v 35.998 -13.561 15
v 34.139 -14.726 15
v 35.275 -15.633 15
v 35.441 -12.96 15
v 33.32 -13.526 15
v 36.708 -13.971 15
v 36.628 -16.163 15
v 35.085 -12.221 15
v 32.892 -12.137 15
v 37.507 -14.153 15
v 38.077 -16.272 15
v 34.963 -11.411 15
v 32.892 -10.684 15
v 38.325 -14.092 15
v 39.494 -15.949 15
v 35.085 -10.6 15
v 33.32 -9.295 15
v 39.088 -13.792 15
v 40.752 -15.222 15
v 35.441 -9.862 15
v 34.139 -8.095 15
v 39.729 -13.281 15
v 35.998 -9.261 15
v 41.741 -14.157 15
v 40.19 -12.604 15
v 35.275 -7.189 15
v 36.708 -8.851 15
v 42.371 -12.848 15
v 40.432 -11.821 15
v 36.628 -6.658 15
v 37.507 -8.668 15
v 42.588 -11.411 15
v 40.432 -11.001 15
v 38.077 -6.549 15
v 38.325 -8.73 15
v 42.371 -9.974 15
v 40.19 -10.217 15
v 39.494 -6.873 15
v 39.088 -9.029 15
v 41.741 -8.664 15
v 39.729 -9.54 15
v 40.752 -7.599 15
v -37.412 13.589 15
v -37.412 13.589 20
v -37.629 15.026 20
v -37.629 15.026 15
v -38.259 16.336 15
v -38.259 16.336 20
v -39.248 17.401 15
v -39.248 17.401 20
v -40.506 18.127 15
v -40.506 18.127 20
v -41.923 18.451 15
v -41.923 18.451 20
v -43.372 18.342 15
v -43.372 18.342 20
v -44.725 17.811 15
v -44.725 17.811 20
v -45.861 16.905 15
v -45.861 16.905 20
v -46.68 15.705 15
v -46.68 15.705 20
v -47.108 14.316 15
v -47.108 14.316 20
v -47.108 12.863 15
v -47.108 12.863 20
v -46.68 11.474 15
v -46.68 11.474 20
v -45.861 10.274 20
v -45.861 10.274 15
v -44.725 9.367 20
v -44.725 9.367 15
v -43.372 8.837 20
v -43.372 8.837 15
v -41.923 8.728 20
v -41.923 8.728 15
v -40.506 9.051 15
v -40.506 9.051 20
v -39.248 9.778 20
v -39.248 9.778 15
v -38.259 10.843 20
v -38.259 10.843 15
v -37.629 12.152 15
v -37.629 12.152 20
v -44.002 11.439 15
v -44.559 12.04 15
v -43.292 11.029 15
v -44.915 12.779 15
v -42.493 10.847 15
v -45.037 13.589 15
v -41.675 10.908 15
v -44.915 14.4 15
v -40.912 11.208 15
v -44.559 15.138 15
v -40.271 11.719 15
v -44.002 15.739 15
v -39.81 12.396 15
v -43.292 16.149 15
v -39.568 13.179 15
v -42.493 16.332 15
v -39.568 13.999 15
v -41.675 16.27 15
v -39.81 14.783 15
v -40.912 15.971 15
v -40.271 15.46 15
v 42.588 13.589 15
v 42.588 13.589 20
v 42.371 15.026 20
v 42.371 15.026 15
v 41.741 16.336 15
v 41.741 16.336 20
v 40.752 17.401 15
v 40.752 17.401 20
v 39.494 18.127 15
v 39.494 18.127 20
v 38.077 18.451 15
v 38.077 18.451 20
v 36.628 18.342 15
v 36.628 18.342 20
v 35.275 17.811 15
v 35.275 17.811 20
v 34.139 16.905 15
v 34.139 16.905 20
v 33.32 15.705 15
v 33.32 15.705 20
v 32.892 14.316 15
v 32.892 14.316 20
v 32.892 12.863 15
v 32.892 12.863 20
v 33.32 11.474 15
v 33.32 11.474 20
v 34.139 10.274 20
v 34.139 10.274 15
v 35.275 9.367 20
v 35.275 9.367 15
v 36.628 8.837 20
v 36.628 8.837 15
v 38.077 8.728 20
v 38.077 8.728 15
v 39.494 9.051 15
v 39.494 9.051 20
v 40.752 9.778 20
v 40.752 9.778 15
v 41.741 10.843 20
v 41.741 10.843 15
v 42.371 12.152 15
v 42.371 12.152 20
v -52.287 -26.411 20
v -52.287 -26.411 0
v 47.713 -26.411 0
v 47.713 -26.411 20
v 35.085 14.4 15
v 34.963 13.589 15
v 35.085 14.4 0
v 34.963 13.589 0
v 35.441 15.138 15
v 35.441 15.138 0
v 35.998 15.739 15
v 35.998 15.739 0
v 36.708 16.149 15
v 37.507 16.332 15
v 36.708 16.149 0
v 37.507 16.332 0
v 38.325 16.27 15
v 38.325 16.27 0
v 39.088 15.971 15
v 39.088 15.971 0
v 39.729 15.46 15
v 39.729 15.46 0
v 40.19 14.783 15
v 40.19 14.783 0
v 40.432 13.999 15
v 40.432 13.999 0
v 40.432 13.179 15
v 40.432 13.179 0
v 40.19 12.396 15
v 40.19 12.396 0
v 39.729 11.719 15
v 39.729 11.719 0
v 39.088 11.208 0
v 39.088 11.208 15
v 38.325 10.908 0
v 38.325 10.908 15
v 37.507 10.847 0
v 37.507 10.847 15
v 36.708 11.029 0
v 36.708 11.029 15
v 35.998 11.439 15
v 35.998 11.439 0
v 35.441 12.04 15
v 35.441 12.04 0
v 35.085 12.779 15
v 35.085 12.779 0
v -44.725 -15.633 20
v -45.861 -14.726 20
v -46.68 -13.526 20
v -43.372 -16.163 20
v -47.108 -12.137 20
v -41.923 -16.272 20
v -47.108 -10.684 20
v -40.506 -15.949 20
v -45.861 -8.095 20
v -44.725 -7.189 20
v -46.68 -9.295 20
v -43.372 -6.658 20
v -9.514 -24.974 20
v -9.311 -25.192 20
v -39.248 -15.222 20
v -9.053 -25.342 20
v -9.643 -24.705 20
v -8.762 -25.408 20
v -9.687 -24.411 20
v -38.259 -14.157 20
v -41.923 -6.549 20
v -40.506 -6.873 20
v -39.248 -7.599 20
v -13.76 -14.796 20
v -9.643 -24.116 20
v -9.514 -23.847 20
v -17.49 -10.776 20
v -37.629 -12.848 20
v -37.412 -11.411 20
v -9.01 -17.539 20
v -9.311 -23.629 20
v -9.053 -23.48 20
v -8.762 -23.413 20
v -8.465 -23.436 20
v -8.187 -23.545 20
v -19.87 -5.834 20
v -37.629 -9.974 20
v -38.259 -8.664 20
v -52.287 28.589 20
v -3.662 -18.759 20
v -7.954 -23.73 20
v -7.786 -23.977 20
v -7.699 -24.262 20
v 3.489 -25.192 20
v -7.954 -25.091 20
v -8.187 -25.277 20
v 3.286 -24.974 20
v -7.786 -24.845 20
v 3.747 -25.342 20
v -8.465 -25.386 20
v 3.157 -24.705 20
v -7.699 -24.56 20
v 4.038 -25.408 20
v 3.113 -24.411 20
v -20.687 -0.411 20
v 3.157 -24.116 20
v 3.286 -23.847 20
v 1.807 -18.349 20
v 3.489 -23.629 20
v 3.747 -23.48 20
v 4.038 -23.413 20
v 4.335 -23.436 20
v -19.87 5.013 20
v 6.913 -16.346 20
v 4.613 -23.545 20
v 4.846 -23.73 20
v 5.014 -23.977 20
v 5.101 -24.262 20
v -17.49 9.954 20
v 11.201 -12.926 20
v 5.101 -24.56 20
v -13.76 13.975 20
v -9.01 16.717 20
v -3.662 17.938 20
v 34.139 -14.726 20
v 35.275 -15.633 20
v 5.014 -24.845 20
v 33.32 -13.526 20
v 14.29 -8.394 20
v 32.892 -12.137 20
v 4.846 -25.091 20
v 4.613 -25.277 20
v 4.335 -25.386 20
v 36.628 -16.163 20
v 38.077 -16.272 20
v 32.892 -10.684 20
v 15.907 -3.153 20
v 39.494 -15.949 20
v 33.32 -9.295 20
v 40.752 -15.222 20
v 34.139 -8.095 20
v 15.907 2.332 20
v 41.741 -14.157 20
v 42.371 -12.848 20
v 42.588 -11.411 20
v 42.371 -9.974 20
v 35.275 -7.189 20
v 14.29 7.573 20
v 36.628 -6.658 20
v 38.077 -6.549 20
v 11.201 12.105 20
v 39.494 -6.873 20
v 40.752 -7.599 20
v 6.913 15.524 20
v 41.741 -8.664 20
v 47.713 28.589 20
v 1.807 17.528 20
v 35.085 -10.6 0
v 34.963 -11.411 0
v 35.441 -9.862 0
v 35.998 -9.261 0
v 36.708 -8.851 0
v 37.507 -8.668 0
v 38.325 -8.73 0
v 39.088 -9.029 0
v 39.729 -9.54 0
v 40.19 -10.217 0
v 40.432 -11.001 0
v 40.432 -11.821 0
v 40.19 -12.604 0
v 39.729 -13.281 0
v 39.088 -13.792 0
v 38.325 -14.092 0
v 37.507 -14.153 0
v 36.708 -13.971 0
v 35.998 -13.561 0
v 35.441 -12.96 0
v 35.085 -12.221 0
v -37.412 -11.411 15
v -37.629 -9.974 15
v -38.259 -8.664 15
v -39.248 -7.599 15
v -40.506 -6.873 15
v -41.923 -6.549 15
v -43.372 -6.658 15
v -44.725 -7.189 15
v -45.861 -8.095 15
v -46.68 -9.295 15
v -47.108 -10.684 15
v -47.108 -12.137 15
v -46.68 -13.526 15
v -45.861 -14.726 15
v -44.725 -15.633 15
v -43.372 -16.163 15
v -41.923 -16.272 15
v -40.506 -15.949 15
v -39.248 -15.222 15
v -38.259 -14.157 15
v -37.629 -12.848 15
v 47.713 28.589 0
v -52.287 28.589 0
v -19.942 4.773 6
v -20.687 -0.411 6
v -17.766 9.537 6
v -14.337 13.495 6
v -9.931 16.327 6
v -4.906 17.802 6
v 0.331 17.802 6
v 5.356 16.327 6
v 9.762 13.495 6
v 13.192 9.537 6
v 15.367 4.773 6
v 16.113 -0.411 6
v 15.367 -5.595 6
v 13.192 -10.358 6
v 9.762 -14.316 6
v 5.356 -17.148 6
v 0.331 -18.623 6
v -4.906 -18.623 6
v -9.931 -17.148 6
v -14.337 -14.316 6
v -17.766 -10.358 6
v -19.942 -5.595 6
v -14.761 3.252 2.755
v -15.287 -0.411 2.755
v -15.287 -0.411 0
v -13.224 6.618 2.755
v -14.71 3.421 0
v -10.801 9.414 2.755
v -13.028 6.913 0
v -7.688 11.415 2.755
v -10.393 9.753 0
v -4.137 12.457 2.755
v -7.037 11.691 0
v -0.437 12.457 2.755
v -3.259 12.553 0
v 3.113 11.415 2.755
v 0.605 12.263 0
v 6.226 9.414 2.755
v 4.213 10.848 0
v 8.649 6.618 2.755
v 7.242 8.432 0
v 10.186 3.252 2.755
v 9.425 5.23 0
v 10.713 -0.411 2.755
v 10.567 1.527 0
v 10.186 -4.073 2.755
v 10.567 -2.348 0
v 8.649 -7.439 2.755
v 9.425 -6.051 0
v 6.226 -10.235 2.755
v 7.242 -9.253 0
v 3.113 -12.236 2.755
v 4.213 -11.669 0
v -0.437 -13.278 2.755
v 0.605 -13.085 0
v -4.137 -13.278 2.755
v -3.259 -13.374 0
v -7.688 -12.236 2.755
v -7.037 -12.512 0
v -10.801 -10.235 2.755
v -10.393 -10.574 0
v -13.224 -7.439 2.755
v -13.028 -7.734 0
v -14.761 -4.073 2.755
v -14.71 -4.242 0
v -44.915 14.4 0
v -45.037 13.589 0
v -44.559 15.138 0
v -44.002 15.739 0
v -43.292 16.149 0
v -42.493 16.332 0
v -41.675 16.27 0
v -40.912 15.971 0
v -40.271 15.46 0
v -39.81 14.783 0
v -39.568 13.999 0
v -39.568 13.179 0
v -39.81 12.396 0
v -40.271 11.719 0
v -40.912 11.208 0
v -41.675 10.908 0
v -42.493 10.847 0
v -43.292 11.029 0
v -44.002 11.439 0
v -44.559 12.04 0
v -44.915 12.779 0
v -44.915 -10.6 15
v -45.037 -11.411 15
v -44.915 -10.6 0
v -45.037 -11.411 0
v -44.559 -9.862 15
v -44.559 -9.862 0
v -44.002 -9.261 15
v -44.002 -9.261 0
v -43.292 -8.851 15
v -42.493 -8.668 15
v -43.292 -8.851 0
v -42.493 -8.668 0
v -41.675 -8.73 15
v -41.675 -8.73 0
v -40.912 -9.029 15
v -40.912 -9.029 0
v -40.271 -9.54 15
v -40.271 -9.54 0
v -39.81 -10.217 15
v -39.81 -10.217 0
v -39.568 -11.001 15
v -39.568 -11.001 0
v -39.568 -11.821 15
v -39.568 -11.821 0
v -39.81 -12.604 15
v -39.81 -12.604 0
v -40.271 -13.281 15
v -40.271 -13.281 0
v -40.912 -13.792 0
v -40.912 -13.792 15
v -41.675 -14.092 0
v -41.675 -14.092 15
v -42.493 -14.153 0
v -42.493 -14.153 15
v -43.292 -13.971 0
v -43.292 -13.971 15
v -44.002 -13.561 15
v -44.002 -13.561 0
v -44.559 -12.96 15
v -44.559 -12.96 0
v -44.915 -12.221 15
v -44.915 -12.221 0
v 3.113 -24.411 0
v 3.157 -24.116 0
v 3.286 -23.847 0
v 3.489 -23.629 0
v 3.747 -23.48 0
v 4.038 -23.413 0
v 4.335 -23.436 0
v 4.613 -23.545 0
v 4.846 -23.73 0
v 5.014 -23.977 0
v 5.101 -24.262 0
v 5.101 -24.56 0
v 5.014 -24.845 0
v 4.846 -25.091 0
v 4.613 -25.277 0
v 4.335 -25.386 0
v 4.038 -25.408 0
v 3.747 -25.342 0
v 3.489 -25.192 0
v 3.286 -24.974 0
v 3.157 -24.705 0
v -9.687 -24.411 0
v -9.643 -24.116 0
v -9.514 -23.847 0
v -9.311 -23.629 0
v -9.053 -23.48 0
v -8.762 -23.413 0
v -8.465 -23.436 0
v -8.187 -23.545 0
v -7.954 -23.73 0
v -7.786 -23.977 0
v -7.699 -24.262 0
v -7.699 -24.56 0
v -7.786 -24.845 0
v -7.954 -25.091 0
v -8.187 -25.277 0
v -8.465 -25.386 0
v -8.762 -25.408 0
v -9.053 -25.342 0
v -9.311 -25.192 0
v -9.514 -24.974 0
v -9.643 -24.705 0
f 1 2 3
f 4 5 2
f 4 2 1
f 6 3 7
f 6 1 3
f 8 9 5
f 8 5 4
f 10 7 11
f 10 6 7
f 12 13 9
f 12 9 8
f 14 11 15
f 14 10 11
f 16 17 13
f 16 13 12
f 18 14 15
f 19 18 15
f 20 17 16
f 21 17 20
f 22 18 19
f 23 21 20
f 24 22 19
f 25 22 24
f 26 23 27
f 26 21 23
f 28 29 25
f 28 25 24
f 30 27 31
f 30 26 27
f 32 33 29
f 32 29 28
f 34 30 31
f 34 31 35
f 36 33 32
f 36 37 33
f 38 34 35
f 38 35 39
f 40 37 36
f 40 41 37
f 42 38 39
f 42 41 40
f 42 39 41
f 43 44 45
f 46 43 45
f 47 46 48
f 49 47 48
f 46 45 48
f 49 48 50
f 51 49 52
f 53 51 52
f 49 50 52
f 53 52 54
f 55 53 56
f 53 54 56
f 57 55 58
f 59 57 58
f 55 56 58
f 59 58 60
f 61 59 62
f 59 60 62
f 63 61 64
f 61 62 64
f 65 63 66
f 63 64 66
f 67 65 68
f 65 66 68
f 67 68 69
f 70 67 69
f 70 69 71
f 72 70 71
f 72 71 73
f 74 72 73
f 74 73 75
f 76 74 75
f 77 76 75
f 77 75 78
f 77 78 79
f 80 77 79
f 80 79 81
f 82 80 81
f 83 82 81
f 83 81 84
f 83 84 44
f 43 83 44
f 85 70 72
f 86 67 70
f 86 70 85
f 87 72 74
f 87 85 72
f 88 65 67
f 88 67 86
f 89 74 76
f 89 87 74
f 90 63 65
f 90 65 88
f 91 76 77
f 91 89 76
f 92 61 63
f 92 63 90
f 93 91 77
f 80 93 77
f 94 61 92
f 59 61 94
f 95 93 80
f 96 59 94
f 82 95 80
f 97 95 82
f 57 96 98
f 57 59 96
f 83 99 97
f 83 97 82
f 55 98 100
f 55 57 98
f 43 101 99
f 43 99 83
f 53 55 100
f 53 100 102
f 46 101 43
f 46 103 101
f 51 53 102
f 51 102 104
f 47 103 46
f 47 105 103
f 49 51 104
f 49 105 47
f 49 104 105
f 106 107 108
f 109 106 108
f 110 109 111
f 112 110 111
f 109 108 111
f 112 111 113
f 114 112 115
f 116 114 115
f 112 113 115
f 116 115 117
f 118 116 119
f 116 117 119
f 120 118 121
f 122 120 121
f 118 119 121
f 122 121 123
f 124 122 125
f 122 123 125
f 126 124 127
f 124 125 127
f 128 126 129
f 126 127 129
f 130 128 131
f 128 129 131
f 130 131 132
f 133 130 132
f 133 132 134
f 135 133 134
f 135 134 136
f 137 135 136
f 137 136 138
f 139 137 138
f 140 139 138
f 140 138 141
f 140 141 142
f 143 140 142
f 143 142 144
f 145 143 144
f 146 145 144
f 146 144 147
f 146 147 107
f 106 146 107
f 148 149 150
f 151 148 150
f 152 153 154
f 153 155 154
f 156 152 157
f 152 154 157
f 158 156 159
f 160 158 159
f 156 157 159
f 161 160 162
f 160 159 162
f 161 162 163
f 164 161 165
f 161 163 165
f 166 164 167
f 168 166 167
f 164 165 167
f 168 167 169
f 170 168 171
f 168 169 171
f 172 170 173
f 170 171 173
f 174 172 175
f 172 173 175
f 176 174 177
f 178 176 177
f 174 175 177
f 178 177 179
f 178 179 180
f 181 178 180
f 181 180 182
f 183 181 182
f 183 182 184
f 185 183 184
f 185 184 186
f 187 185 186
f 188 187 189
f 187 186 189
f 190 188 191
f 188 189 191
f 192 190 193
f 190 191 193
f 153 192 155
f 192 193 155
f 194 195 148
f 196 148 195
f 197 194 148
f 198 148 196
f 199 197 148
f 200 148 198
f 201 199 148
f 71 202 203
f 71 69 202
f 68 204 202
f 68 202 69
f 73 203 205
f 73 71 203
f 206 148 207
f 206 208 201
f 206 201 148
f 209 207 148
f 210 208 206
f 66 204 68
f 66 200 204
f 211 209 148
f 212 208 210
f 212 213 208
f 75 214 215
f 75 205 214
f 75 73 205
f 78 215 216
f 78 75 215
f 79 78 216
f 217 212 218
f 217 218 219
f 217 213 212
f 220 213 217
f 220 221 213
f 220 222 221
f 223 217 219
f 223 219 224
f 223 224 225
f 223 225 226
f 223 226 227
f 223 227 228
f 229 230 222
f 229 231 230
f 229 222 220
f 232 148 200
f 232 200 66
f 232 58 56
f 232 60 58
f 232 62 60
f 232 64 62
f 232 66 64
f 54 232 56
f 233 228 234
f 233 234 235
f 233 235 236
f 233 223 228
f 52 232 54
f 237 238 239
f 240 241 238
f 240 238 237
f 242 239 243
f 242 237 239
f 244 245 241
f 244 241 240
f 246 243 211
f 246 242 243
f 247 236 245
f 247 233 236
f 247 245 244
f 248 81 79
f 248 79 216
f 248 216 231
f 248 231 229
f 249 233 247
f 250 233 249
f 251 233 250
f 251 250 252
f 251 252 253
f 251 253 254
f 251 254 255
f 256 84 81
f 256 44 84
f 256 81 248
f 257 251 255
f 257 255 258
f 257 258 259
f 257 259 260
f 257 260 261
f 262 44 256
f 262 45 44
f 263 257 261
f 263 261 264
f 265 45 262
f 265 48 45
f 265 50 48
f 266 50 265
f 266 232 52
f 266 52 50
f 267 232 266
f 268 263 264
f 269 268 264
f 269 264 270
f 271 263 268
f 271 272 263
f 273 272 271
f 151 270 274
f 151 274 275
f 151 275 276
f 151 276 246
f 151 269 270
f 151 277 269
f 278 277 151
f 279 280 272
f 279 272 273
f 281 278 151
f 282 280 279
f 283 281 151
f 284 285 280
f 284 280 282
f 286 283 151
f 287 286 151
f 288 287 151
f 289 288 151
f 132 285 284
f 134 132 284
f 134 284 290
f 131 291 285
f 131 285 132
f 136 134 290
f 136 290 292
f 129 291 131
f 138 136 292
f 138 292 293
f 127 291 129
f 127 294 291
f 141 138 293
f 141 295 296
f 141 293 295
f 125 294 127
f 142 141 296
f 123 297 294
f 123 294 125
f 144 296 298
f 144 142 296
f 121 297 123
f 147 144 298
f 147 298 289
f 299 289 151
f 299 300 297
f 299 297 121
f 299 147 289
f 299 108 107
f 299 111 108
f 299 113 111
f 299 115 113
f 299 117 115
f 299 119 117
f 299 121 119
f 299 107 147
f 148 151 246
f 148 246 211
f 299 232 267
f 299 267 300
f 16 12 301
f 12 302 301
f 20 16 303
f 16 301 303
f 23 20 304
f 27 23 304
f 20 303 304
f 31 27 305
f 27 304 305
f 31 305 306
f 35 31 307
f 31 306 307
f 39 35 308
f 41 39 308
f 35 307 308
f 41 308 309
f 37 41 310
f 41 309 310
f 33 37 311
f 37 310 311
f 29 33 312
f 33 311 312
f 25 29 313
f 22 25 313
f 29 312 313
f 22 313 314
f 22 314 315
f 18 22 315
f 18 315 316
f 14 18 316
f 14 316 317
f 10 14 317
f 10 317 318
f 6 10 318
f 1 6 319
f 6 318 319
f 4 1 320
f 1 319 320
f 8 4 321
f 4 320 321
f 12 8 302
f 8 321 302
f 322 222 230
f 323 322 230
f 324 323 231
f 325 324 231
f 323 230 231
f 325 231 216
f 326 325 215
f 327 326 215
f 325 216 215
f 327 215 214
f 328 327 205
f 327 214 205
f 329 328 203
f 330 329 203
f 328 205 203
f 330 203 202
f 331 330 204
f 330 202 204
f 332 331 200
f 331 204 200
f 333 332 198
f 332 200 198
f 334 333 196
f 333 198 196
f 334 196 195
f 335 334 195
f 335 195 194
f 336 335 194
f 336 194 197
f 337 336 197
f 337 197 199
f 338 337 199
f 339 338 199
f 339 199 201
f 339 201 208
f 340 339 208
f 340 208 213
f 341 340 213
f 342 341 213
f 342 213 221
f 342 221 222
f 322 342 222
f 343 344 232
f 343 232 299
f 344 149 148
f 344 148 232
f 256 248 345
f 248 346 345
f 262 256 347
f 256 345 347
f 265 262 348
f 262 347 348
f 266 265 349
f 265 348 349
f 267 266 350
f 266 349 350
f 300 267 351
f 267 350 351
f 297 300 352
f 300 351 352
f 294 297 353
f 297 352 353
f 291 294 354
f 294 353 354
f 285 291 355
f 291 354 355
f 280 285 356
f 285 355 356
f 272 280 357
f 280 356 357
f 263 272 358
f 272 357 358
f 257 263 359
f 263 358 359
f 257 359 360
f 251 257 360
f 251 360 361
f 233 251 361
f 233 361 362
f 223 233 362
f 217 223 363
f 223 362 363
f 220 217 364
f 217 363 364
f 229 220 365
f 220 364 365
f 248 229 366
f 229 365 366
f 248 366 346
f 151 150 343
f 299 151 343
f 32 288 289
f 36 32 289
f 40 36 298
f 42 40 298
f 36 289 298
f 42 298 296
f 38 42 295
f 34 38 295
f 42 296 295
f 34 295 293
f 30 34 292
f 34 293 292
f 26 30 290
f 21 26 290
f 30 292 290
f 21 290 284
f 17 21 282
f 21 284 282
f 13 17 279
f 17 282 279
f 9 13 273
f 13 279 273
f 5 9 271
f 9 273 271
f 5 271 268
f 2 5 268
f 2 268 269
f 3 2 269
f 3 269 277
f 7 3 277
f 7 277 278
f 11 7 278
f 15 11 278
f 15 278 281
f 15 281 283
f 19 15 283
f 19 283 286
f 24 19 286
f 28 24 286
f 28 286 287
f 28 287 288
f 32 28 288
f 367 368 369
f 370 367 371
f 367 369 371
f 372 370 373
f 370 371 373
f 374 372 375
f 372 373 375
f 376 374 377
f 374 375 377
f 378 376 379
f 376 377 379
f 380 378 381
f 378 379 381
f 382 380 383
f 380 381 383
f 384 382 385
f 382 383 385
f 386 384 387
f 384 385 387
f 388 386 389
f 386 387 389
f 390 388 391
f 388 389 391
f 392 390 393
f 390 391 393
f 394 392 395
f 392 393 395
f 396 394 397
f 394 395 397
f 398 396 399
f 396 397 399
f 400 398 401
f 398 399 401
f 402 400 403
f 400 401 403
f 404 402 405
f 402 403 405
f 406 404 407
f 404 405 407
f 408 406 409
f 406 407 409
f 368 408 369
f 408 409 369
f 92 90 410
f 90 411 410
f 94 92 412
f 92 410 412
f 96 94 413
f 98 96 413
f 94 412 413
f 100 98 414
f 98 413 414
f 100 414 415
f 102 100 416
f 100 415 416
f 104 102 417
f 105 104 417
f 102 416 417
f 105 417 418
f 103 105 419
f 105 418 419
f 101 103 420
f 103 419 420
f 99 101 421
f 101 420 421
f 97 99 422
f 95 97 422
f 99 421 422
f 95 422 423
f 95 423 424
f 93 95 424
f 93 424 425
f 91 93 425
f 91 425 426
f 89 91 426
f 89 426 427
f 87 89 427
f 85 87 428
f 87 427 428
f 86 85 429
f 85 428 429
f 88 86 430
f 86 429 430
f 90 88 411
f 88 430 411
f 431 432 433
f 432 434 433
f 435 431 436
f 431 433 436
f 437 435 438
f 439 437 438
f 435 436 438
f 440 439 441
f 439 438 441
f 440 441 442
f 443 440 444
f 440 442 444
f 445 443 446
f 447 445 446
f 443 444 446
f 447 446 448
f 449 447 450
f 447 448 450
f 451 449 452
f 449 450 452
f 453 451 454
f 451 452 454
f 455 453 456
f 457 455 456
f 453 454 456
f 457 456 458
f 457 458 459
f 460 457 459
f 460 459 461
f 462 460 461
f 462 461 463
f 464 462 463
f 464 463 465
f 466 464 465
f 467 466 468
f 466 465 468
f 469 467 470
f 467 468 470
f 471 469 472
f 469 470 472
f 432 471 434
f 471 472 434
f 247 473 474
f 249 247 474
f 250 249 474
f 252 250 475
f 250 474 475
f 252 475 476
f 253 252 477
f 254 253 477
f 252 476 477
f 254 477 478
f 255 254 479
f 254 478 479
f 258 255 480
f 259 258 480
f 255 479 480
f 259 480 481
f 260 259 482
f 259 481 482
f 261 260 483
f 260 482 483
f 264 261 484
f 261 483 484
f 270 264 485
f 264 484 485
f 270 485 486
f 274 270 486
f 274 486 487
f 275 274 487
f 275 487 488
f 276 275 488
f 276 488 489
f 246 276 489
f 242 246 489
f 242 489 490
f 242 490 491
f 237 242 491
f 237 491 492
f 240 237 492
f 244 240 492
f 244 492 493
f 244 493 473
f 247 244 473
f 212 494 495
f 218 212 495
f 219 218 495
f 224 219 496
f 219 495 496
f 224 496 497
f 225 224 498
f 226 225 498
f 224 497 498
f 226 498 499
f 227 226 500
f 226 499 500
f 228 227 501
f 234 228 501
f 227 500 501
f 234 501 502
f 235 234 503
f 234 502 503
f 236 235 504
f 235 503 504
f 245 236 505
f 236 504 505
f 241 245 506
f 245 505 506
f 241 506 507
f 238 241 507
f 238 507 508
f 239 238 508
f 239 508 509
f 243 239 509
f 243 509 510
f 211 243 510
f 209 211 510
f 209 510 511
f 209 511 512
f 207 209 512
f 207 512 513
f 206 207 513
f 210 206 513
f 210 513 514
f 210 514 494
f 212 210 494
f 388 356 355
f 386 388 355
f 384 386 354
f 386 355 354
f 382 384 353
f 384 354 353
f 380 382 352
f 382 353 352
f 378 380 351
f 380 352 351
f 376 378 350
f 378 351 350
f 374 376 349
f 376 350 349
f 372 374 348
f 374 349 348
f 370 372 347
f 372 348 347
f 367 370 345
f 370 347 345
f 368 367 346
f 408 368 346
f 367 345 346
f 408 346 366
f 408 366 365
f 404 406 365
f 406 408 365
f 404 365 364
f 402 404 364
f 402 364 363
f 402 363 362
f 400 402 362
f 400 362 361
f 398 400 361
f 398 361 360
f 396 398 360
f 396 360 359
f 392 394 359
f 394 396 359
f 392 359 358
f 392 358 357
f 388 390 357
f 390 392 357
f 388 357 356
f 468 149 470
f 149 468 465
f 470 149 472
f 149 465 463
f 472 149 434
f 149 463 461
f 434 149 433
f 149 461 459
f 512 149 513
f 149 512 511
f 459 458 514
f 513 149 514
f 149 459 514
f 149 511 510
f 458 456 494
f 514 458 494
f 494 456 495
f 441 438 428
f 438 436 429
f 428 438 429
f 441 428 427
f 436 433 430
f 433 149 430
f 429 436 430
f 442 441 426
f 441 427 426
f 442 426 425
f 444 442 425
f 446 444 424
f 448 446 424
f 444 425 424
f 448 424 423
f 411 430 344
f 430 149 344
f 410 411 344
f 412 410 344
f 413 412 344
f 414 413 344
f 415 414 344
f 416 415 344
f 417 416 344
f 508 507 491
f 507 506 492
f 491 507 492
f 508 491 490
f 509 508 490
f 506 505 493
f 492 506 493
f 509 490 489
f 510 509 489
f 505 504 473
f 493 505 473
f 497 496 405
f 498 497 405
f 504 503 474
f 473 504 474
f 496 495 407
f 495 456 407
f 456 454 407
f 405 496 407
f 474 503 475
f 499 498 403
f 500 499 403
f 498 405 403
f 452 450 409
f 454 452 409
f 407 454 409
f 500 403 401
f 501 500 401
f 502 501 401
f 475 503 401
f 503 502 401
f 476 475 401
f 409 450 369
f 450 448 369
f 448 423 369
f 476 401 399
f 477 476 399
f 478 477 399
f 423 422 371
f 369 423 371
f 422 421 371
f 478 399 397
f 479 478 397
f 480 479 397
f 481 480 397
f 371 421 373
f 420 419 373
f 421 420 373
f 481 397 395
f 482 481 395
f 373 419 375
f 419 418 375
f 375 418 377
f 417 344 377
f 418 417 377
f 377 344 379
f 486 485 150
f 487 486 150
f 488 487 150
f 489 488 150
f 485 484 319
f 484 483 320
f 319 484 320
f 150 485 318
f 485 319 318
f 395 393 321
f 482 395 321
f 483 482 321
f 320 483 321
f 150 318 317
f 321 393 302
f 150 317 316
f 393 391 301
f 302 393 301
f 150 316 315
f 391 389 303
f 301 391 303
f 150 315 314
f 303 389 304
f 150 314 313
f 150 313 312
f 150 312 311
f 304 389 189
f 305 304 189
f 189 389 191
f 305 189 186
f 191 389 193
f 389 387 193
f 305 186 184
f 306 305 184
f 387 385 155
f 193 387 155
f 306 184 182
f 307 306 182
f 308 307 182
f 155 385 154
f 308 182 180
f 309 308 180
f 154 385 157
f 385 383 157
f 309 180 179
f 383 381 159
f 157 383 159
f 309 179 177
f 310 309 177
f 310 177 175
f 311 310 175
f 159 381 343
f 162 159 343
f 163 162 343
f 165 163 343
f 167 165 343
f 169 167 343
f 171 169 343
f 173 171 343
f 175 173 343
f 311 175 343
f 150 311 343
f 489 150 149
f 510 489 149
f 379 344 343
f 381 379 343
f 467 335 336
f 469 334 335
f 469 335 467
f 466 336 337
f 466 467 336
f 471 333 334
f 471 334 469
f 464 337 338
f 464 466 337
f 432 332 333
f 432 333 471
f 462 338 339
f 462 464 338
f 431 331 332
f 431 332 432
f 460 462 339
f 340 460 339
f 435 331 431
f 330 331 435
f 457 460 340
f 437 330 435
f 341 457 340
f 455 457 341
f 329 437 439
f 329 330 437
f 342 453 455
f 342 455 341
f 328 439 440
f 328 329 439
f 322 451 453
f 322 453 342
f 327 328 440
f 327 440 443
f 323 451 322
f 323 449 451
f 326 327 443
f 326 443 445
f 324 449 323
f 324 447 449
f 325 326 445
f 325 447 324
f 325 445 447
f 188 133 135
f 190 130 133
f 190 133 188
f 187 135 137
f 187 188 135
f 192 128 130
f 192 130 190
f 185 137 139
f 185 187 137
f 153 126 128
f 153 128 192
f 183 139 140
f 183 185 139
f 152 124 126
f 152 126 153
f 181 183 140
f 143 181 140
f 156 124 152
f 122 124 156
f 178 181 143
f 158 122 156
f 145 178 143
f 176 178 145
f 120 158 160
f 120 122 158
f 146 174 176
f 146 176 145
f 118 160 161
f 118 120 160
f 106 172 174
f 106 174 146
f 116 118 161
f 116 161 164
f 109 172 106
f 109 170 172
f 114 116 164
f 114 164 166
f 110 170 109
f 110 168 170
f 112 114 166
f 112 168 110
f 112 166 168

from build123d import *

# Parameters (mm, degrees)
F0_W           = 100
F0_H           = 55
F1_DEPTH       = 20
F3_D           = 26
F4_D           = 36.8
F4_DEPTH       = 14
F4_TIP         = 11.0558353901
F6_D           = 2
F8_D           = 5.5
F8_CBORE_D     = 9.75
F8_CBORE_DEPTH = 5


with BuildPart() as f1:
    # F0 (on Top) → F1 (new body)
    with BuildSketch(Plane.XY):
        with Locations((-2.2873312235, 1.0893514007)):
            Rectangle(F0_W, F0_H)
    extrude(amount=F1_DEPTH)

    # F3 (through all)
    with Locations(Plane.XY.offset(20)):
        with Locations((-2.2873312235, -0.4106485993)):
            Hole(F3_D / 2)

    # F4
    with Locations(Plane.XY.offset(20)):
        with Locations((-2.2873312235, -0.4106485993)):
            Hole(F4_D / 2, depth=F4_DEPTH)
            with Locations((0, 0, -(F4_DEPTH + F4_TIP / 2))):  # 118° drill point
                Cone(0, F4_D / 2, F4_TIP, mode=Mode.SUBTRACT)

    # F6 (through all)
    with Locations(Plane.XY.offset(20)):
        with Locations((-8.6873312235, -24.4106485993), (4.1126687765, -24.4106485993)):
            Hole(F6_D / 2)

    # F8 (through all)
    with Locations(Plane.XY.offset(20)):
        with Locations((-42.2873312235, 13.5893514007), (-42.2873312235, -11.4106485993), (37.7126687765, -11.4106485993), (37.7126687765, 13.5893514007)):
            CounterBoreHole(F8_D / 2, F8_CBORE_D / 2, F8_CBORE_DEPTH)


solid = f1.part
